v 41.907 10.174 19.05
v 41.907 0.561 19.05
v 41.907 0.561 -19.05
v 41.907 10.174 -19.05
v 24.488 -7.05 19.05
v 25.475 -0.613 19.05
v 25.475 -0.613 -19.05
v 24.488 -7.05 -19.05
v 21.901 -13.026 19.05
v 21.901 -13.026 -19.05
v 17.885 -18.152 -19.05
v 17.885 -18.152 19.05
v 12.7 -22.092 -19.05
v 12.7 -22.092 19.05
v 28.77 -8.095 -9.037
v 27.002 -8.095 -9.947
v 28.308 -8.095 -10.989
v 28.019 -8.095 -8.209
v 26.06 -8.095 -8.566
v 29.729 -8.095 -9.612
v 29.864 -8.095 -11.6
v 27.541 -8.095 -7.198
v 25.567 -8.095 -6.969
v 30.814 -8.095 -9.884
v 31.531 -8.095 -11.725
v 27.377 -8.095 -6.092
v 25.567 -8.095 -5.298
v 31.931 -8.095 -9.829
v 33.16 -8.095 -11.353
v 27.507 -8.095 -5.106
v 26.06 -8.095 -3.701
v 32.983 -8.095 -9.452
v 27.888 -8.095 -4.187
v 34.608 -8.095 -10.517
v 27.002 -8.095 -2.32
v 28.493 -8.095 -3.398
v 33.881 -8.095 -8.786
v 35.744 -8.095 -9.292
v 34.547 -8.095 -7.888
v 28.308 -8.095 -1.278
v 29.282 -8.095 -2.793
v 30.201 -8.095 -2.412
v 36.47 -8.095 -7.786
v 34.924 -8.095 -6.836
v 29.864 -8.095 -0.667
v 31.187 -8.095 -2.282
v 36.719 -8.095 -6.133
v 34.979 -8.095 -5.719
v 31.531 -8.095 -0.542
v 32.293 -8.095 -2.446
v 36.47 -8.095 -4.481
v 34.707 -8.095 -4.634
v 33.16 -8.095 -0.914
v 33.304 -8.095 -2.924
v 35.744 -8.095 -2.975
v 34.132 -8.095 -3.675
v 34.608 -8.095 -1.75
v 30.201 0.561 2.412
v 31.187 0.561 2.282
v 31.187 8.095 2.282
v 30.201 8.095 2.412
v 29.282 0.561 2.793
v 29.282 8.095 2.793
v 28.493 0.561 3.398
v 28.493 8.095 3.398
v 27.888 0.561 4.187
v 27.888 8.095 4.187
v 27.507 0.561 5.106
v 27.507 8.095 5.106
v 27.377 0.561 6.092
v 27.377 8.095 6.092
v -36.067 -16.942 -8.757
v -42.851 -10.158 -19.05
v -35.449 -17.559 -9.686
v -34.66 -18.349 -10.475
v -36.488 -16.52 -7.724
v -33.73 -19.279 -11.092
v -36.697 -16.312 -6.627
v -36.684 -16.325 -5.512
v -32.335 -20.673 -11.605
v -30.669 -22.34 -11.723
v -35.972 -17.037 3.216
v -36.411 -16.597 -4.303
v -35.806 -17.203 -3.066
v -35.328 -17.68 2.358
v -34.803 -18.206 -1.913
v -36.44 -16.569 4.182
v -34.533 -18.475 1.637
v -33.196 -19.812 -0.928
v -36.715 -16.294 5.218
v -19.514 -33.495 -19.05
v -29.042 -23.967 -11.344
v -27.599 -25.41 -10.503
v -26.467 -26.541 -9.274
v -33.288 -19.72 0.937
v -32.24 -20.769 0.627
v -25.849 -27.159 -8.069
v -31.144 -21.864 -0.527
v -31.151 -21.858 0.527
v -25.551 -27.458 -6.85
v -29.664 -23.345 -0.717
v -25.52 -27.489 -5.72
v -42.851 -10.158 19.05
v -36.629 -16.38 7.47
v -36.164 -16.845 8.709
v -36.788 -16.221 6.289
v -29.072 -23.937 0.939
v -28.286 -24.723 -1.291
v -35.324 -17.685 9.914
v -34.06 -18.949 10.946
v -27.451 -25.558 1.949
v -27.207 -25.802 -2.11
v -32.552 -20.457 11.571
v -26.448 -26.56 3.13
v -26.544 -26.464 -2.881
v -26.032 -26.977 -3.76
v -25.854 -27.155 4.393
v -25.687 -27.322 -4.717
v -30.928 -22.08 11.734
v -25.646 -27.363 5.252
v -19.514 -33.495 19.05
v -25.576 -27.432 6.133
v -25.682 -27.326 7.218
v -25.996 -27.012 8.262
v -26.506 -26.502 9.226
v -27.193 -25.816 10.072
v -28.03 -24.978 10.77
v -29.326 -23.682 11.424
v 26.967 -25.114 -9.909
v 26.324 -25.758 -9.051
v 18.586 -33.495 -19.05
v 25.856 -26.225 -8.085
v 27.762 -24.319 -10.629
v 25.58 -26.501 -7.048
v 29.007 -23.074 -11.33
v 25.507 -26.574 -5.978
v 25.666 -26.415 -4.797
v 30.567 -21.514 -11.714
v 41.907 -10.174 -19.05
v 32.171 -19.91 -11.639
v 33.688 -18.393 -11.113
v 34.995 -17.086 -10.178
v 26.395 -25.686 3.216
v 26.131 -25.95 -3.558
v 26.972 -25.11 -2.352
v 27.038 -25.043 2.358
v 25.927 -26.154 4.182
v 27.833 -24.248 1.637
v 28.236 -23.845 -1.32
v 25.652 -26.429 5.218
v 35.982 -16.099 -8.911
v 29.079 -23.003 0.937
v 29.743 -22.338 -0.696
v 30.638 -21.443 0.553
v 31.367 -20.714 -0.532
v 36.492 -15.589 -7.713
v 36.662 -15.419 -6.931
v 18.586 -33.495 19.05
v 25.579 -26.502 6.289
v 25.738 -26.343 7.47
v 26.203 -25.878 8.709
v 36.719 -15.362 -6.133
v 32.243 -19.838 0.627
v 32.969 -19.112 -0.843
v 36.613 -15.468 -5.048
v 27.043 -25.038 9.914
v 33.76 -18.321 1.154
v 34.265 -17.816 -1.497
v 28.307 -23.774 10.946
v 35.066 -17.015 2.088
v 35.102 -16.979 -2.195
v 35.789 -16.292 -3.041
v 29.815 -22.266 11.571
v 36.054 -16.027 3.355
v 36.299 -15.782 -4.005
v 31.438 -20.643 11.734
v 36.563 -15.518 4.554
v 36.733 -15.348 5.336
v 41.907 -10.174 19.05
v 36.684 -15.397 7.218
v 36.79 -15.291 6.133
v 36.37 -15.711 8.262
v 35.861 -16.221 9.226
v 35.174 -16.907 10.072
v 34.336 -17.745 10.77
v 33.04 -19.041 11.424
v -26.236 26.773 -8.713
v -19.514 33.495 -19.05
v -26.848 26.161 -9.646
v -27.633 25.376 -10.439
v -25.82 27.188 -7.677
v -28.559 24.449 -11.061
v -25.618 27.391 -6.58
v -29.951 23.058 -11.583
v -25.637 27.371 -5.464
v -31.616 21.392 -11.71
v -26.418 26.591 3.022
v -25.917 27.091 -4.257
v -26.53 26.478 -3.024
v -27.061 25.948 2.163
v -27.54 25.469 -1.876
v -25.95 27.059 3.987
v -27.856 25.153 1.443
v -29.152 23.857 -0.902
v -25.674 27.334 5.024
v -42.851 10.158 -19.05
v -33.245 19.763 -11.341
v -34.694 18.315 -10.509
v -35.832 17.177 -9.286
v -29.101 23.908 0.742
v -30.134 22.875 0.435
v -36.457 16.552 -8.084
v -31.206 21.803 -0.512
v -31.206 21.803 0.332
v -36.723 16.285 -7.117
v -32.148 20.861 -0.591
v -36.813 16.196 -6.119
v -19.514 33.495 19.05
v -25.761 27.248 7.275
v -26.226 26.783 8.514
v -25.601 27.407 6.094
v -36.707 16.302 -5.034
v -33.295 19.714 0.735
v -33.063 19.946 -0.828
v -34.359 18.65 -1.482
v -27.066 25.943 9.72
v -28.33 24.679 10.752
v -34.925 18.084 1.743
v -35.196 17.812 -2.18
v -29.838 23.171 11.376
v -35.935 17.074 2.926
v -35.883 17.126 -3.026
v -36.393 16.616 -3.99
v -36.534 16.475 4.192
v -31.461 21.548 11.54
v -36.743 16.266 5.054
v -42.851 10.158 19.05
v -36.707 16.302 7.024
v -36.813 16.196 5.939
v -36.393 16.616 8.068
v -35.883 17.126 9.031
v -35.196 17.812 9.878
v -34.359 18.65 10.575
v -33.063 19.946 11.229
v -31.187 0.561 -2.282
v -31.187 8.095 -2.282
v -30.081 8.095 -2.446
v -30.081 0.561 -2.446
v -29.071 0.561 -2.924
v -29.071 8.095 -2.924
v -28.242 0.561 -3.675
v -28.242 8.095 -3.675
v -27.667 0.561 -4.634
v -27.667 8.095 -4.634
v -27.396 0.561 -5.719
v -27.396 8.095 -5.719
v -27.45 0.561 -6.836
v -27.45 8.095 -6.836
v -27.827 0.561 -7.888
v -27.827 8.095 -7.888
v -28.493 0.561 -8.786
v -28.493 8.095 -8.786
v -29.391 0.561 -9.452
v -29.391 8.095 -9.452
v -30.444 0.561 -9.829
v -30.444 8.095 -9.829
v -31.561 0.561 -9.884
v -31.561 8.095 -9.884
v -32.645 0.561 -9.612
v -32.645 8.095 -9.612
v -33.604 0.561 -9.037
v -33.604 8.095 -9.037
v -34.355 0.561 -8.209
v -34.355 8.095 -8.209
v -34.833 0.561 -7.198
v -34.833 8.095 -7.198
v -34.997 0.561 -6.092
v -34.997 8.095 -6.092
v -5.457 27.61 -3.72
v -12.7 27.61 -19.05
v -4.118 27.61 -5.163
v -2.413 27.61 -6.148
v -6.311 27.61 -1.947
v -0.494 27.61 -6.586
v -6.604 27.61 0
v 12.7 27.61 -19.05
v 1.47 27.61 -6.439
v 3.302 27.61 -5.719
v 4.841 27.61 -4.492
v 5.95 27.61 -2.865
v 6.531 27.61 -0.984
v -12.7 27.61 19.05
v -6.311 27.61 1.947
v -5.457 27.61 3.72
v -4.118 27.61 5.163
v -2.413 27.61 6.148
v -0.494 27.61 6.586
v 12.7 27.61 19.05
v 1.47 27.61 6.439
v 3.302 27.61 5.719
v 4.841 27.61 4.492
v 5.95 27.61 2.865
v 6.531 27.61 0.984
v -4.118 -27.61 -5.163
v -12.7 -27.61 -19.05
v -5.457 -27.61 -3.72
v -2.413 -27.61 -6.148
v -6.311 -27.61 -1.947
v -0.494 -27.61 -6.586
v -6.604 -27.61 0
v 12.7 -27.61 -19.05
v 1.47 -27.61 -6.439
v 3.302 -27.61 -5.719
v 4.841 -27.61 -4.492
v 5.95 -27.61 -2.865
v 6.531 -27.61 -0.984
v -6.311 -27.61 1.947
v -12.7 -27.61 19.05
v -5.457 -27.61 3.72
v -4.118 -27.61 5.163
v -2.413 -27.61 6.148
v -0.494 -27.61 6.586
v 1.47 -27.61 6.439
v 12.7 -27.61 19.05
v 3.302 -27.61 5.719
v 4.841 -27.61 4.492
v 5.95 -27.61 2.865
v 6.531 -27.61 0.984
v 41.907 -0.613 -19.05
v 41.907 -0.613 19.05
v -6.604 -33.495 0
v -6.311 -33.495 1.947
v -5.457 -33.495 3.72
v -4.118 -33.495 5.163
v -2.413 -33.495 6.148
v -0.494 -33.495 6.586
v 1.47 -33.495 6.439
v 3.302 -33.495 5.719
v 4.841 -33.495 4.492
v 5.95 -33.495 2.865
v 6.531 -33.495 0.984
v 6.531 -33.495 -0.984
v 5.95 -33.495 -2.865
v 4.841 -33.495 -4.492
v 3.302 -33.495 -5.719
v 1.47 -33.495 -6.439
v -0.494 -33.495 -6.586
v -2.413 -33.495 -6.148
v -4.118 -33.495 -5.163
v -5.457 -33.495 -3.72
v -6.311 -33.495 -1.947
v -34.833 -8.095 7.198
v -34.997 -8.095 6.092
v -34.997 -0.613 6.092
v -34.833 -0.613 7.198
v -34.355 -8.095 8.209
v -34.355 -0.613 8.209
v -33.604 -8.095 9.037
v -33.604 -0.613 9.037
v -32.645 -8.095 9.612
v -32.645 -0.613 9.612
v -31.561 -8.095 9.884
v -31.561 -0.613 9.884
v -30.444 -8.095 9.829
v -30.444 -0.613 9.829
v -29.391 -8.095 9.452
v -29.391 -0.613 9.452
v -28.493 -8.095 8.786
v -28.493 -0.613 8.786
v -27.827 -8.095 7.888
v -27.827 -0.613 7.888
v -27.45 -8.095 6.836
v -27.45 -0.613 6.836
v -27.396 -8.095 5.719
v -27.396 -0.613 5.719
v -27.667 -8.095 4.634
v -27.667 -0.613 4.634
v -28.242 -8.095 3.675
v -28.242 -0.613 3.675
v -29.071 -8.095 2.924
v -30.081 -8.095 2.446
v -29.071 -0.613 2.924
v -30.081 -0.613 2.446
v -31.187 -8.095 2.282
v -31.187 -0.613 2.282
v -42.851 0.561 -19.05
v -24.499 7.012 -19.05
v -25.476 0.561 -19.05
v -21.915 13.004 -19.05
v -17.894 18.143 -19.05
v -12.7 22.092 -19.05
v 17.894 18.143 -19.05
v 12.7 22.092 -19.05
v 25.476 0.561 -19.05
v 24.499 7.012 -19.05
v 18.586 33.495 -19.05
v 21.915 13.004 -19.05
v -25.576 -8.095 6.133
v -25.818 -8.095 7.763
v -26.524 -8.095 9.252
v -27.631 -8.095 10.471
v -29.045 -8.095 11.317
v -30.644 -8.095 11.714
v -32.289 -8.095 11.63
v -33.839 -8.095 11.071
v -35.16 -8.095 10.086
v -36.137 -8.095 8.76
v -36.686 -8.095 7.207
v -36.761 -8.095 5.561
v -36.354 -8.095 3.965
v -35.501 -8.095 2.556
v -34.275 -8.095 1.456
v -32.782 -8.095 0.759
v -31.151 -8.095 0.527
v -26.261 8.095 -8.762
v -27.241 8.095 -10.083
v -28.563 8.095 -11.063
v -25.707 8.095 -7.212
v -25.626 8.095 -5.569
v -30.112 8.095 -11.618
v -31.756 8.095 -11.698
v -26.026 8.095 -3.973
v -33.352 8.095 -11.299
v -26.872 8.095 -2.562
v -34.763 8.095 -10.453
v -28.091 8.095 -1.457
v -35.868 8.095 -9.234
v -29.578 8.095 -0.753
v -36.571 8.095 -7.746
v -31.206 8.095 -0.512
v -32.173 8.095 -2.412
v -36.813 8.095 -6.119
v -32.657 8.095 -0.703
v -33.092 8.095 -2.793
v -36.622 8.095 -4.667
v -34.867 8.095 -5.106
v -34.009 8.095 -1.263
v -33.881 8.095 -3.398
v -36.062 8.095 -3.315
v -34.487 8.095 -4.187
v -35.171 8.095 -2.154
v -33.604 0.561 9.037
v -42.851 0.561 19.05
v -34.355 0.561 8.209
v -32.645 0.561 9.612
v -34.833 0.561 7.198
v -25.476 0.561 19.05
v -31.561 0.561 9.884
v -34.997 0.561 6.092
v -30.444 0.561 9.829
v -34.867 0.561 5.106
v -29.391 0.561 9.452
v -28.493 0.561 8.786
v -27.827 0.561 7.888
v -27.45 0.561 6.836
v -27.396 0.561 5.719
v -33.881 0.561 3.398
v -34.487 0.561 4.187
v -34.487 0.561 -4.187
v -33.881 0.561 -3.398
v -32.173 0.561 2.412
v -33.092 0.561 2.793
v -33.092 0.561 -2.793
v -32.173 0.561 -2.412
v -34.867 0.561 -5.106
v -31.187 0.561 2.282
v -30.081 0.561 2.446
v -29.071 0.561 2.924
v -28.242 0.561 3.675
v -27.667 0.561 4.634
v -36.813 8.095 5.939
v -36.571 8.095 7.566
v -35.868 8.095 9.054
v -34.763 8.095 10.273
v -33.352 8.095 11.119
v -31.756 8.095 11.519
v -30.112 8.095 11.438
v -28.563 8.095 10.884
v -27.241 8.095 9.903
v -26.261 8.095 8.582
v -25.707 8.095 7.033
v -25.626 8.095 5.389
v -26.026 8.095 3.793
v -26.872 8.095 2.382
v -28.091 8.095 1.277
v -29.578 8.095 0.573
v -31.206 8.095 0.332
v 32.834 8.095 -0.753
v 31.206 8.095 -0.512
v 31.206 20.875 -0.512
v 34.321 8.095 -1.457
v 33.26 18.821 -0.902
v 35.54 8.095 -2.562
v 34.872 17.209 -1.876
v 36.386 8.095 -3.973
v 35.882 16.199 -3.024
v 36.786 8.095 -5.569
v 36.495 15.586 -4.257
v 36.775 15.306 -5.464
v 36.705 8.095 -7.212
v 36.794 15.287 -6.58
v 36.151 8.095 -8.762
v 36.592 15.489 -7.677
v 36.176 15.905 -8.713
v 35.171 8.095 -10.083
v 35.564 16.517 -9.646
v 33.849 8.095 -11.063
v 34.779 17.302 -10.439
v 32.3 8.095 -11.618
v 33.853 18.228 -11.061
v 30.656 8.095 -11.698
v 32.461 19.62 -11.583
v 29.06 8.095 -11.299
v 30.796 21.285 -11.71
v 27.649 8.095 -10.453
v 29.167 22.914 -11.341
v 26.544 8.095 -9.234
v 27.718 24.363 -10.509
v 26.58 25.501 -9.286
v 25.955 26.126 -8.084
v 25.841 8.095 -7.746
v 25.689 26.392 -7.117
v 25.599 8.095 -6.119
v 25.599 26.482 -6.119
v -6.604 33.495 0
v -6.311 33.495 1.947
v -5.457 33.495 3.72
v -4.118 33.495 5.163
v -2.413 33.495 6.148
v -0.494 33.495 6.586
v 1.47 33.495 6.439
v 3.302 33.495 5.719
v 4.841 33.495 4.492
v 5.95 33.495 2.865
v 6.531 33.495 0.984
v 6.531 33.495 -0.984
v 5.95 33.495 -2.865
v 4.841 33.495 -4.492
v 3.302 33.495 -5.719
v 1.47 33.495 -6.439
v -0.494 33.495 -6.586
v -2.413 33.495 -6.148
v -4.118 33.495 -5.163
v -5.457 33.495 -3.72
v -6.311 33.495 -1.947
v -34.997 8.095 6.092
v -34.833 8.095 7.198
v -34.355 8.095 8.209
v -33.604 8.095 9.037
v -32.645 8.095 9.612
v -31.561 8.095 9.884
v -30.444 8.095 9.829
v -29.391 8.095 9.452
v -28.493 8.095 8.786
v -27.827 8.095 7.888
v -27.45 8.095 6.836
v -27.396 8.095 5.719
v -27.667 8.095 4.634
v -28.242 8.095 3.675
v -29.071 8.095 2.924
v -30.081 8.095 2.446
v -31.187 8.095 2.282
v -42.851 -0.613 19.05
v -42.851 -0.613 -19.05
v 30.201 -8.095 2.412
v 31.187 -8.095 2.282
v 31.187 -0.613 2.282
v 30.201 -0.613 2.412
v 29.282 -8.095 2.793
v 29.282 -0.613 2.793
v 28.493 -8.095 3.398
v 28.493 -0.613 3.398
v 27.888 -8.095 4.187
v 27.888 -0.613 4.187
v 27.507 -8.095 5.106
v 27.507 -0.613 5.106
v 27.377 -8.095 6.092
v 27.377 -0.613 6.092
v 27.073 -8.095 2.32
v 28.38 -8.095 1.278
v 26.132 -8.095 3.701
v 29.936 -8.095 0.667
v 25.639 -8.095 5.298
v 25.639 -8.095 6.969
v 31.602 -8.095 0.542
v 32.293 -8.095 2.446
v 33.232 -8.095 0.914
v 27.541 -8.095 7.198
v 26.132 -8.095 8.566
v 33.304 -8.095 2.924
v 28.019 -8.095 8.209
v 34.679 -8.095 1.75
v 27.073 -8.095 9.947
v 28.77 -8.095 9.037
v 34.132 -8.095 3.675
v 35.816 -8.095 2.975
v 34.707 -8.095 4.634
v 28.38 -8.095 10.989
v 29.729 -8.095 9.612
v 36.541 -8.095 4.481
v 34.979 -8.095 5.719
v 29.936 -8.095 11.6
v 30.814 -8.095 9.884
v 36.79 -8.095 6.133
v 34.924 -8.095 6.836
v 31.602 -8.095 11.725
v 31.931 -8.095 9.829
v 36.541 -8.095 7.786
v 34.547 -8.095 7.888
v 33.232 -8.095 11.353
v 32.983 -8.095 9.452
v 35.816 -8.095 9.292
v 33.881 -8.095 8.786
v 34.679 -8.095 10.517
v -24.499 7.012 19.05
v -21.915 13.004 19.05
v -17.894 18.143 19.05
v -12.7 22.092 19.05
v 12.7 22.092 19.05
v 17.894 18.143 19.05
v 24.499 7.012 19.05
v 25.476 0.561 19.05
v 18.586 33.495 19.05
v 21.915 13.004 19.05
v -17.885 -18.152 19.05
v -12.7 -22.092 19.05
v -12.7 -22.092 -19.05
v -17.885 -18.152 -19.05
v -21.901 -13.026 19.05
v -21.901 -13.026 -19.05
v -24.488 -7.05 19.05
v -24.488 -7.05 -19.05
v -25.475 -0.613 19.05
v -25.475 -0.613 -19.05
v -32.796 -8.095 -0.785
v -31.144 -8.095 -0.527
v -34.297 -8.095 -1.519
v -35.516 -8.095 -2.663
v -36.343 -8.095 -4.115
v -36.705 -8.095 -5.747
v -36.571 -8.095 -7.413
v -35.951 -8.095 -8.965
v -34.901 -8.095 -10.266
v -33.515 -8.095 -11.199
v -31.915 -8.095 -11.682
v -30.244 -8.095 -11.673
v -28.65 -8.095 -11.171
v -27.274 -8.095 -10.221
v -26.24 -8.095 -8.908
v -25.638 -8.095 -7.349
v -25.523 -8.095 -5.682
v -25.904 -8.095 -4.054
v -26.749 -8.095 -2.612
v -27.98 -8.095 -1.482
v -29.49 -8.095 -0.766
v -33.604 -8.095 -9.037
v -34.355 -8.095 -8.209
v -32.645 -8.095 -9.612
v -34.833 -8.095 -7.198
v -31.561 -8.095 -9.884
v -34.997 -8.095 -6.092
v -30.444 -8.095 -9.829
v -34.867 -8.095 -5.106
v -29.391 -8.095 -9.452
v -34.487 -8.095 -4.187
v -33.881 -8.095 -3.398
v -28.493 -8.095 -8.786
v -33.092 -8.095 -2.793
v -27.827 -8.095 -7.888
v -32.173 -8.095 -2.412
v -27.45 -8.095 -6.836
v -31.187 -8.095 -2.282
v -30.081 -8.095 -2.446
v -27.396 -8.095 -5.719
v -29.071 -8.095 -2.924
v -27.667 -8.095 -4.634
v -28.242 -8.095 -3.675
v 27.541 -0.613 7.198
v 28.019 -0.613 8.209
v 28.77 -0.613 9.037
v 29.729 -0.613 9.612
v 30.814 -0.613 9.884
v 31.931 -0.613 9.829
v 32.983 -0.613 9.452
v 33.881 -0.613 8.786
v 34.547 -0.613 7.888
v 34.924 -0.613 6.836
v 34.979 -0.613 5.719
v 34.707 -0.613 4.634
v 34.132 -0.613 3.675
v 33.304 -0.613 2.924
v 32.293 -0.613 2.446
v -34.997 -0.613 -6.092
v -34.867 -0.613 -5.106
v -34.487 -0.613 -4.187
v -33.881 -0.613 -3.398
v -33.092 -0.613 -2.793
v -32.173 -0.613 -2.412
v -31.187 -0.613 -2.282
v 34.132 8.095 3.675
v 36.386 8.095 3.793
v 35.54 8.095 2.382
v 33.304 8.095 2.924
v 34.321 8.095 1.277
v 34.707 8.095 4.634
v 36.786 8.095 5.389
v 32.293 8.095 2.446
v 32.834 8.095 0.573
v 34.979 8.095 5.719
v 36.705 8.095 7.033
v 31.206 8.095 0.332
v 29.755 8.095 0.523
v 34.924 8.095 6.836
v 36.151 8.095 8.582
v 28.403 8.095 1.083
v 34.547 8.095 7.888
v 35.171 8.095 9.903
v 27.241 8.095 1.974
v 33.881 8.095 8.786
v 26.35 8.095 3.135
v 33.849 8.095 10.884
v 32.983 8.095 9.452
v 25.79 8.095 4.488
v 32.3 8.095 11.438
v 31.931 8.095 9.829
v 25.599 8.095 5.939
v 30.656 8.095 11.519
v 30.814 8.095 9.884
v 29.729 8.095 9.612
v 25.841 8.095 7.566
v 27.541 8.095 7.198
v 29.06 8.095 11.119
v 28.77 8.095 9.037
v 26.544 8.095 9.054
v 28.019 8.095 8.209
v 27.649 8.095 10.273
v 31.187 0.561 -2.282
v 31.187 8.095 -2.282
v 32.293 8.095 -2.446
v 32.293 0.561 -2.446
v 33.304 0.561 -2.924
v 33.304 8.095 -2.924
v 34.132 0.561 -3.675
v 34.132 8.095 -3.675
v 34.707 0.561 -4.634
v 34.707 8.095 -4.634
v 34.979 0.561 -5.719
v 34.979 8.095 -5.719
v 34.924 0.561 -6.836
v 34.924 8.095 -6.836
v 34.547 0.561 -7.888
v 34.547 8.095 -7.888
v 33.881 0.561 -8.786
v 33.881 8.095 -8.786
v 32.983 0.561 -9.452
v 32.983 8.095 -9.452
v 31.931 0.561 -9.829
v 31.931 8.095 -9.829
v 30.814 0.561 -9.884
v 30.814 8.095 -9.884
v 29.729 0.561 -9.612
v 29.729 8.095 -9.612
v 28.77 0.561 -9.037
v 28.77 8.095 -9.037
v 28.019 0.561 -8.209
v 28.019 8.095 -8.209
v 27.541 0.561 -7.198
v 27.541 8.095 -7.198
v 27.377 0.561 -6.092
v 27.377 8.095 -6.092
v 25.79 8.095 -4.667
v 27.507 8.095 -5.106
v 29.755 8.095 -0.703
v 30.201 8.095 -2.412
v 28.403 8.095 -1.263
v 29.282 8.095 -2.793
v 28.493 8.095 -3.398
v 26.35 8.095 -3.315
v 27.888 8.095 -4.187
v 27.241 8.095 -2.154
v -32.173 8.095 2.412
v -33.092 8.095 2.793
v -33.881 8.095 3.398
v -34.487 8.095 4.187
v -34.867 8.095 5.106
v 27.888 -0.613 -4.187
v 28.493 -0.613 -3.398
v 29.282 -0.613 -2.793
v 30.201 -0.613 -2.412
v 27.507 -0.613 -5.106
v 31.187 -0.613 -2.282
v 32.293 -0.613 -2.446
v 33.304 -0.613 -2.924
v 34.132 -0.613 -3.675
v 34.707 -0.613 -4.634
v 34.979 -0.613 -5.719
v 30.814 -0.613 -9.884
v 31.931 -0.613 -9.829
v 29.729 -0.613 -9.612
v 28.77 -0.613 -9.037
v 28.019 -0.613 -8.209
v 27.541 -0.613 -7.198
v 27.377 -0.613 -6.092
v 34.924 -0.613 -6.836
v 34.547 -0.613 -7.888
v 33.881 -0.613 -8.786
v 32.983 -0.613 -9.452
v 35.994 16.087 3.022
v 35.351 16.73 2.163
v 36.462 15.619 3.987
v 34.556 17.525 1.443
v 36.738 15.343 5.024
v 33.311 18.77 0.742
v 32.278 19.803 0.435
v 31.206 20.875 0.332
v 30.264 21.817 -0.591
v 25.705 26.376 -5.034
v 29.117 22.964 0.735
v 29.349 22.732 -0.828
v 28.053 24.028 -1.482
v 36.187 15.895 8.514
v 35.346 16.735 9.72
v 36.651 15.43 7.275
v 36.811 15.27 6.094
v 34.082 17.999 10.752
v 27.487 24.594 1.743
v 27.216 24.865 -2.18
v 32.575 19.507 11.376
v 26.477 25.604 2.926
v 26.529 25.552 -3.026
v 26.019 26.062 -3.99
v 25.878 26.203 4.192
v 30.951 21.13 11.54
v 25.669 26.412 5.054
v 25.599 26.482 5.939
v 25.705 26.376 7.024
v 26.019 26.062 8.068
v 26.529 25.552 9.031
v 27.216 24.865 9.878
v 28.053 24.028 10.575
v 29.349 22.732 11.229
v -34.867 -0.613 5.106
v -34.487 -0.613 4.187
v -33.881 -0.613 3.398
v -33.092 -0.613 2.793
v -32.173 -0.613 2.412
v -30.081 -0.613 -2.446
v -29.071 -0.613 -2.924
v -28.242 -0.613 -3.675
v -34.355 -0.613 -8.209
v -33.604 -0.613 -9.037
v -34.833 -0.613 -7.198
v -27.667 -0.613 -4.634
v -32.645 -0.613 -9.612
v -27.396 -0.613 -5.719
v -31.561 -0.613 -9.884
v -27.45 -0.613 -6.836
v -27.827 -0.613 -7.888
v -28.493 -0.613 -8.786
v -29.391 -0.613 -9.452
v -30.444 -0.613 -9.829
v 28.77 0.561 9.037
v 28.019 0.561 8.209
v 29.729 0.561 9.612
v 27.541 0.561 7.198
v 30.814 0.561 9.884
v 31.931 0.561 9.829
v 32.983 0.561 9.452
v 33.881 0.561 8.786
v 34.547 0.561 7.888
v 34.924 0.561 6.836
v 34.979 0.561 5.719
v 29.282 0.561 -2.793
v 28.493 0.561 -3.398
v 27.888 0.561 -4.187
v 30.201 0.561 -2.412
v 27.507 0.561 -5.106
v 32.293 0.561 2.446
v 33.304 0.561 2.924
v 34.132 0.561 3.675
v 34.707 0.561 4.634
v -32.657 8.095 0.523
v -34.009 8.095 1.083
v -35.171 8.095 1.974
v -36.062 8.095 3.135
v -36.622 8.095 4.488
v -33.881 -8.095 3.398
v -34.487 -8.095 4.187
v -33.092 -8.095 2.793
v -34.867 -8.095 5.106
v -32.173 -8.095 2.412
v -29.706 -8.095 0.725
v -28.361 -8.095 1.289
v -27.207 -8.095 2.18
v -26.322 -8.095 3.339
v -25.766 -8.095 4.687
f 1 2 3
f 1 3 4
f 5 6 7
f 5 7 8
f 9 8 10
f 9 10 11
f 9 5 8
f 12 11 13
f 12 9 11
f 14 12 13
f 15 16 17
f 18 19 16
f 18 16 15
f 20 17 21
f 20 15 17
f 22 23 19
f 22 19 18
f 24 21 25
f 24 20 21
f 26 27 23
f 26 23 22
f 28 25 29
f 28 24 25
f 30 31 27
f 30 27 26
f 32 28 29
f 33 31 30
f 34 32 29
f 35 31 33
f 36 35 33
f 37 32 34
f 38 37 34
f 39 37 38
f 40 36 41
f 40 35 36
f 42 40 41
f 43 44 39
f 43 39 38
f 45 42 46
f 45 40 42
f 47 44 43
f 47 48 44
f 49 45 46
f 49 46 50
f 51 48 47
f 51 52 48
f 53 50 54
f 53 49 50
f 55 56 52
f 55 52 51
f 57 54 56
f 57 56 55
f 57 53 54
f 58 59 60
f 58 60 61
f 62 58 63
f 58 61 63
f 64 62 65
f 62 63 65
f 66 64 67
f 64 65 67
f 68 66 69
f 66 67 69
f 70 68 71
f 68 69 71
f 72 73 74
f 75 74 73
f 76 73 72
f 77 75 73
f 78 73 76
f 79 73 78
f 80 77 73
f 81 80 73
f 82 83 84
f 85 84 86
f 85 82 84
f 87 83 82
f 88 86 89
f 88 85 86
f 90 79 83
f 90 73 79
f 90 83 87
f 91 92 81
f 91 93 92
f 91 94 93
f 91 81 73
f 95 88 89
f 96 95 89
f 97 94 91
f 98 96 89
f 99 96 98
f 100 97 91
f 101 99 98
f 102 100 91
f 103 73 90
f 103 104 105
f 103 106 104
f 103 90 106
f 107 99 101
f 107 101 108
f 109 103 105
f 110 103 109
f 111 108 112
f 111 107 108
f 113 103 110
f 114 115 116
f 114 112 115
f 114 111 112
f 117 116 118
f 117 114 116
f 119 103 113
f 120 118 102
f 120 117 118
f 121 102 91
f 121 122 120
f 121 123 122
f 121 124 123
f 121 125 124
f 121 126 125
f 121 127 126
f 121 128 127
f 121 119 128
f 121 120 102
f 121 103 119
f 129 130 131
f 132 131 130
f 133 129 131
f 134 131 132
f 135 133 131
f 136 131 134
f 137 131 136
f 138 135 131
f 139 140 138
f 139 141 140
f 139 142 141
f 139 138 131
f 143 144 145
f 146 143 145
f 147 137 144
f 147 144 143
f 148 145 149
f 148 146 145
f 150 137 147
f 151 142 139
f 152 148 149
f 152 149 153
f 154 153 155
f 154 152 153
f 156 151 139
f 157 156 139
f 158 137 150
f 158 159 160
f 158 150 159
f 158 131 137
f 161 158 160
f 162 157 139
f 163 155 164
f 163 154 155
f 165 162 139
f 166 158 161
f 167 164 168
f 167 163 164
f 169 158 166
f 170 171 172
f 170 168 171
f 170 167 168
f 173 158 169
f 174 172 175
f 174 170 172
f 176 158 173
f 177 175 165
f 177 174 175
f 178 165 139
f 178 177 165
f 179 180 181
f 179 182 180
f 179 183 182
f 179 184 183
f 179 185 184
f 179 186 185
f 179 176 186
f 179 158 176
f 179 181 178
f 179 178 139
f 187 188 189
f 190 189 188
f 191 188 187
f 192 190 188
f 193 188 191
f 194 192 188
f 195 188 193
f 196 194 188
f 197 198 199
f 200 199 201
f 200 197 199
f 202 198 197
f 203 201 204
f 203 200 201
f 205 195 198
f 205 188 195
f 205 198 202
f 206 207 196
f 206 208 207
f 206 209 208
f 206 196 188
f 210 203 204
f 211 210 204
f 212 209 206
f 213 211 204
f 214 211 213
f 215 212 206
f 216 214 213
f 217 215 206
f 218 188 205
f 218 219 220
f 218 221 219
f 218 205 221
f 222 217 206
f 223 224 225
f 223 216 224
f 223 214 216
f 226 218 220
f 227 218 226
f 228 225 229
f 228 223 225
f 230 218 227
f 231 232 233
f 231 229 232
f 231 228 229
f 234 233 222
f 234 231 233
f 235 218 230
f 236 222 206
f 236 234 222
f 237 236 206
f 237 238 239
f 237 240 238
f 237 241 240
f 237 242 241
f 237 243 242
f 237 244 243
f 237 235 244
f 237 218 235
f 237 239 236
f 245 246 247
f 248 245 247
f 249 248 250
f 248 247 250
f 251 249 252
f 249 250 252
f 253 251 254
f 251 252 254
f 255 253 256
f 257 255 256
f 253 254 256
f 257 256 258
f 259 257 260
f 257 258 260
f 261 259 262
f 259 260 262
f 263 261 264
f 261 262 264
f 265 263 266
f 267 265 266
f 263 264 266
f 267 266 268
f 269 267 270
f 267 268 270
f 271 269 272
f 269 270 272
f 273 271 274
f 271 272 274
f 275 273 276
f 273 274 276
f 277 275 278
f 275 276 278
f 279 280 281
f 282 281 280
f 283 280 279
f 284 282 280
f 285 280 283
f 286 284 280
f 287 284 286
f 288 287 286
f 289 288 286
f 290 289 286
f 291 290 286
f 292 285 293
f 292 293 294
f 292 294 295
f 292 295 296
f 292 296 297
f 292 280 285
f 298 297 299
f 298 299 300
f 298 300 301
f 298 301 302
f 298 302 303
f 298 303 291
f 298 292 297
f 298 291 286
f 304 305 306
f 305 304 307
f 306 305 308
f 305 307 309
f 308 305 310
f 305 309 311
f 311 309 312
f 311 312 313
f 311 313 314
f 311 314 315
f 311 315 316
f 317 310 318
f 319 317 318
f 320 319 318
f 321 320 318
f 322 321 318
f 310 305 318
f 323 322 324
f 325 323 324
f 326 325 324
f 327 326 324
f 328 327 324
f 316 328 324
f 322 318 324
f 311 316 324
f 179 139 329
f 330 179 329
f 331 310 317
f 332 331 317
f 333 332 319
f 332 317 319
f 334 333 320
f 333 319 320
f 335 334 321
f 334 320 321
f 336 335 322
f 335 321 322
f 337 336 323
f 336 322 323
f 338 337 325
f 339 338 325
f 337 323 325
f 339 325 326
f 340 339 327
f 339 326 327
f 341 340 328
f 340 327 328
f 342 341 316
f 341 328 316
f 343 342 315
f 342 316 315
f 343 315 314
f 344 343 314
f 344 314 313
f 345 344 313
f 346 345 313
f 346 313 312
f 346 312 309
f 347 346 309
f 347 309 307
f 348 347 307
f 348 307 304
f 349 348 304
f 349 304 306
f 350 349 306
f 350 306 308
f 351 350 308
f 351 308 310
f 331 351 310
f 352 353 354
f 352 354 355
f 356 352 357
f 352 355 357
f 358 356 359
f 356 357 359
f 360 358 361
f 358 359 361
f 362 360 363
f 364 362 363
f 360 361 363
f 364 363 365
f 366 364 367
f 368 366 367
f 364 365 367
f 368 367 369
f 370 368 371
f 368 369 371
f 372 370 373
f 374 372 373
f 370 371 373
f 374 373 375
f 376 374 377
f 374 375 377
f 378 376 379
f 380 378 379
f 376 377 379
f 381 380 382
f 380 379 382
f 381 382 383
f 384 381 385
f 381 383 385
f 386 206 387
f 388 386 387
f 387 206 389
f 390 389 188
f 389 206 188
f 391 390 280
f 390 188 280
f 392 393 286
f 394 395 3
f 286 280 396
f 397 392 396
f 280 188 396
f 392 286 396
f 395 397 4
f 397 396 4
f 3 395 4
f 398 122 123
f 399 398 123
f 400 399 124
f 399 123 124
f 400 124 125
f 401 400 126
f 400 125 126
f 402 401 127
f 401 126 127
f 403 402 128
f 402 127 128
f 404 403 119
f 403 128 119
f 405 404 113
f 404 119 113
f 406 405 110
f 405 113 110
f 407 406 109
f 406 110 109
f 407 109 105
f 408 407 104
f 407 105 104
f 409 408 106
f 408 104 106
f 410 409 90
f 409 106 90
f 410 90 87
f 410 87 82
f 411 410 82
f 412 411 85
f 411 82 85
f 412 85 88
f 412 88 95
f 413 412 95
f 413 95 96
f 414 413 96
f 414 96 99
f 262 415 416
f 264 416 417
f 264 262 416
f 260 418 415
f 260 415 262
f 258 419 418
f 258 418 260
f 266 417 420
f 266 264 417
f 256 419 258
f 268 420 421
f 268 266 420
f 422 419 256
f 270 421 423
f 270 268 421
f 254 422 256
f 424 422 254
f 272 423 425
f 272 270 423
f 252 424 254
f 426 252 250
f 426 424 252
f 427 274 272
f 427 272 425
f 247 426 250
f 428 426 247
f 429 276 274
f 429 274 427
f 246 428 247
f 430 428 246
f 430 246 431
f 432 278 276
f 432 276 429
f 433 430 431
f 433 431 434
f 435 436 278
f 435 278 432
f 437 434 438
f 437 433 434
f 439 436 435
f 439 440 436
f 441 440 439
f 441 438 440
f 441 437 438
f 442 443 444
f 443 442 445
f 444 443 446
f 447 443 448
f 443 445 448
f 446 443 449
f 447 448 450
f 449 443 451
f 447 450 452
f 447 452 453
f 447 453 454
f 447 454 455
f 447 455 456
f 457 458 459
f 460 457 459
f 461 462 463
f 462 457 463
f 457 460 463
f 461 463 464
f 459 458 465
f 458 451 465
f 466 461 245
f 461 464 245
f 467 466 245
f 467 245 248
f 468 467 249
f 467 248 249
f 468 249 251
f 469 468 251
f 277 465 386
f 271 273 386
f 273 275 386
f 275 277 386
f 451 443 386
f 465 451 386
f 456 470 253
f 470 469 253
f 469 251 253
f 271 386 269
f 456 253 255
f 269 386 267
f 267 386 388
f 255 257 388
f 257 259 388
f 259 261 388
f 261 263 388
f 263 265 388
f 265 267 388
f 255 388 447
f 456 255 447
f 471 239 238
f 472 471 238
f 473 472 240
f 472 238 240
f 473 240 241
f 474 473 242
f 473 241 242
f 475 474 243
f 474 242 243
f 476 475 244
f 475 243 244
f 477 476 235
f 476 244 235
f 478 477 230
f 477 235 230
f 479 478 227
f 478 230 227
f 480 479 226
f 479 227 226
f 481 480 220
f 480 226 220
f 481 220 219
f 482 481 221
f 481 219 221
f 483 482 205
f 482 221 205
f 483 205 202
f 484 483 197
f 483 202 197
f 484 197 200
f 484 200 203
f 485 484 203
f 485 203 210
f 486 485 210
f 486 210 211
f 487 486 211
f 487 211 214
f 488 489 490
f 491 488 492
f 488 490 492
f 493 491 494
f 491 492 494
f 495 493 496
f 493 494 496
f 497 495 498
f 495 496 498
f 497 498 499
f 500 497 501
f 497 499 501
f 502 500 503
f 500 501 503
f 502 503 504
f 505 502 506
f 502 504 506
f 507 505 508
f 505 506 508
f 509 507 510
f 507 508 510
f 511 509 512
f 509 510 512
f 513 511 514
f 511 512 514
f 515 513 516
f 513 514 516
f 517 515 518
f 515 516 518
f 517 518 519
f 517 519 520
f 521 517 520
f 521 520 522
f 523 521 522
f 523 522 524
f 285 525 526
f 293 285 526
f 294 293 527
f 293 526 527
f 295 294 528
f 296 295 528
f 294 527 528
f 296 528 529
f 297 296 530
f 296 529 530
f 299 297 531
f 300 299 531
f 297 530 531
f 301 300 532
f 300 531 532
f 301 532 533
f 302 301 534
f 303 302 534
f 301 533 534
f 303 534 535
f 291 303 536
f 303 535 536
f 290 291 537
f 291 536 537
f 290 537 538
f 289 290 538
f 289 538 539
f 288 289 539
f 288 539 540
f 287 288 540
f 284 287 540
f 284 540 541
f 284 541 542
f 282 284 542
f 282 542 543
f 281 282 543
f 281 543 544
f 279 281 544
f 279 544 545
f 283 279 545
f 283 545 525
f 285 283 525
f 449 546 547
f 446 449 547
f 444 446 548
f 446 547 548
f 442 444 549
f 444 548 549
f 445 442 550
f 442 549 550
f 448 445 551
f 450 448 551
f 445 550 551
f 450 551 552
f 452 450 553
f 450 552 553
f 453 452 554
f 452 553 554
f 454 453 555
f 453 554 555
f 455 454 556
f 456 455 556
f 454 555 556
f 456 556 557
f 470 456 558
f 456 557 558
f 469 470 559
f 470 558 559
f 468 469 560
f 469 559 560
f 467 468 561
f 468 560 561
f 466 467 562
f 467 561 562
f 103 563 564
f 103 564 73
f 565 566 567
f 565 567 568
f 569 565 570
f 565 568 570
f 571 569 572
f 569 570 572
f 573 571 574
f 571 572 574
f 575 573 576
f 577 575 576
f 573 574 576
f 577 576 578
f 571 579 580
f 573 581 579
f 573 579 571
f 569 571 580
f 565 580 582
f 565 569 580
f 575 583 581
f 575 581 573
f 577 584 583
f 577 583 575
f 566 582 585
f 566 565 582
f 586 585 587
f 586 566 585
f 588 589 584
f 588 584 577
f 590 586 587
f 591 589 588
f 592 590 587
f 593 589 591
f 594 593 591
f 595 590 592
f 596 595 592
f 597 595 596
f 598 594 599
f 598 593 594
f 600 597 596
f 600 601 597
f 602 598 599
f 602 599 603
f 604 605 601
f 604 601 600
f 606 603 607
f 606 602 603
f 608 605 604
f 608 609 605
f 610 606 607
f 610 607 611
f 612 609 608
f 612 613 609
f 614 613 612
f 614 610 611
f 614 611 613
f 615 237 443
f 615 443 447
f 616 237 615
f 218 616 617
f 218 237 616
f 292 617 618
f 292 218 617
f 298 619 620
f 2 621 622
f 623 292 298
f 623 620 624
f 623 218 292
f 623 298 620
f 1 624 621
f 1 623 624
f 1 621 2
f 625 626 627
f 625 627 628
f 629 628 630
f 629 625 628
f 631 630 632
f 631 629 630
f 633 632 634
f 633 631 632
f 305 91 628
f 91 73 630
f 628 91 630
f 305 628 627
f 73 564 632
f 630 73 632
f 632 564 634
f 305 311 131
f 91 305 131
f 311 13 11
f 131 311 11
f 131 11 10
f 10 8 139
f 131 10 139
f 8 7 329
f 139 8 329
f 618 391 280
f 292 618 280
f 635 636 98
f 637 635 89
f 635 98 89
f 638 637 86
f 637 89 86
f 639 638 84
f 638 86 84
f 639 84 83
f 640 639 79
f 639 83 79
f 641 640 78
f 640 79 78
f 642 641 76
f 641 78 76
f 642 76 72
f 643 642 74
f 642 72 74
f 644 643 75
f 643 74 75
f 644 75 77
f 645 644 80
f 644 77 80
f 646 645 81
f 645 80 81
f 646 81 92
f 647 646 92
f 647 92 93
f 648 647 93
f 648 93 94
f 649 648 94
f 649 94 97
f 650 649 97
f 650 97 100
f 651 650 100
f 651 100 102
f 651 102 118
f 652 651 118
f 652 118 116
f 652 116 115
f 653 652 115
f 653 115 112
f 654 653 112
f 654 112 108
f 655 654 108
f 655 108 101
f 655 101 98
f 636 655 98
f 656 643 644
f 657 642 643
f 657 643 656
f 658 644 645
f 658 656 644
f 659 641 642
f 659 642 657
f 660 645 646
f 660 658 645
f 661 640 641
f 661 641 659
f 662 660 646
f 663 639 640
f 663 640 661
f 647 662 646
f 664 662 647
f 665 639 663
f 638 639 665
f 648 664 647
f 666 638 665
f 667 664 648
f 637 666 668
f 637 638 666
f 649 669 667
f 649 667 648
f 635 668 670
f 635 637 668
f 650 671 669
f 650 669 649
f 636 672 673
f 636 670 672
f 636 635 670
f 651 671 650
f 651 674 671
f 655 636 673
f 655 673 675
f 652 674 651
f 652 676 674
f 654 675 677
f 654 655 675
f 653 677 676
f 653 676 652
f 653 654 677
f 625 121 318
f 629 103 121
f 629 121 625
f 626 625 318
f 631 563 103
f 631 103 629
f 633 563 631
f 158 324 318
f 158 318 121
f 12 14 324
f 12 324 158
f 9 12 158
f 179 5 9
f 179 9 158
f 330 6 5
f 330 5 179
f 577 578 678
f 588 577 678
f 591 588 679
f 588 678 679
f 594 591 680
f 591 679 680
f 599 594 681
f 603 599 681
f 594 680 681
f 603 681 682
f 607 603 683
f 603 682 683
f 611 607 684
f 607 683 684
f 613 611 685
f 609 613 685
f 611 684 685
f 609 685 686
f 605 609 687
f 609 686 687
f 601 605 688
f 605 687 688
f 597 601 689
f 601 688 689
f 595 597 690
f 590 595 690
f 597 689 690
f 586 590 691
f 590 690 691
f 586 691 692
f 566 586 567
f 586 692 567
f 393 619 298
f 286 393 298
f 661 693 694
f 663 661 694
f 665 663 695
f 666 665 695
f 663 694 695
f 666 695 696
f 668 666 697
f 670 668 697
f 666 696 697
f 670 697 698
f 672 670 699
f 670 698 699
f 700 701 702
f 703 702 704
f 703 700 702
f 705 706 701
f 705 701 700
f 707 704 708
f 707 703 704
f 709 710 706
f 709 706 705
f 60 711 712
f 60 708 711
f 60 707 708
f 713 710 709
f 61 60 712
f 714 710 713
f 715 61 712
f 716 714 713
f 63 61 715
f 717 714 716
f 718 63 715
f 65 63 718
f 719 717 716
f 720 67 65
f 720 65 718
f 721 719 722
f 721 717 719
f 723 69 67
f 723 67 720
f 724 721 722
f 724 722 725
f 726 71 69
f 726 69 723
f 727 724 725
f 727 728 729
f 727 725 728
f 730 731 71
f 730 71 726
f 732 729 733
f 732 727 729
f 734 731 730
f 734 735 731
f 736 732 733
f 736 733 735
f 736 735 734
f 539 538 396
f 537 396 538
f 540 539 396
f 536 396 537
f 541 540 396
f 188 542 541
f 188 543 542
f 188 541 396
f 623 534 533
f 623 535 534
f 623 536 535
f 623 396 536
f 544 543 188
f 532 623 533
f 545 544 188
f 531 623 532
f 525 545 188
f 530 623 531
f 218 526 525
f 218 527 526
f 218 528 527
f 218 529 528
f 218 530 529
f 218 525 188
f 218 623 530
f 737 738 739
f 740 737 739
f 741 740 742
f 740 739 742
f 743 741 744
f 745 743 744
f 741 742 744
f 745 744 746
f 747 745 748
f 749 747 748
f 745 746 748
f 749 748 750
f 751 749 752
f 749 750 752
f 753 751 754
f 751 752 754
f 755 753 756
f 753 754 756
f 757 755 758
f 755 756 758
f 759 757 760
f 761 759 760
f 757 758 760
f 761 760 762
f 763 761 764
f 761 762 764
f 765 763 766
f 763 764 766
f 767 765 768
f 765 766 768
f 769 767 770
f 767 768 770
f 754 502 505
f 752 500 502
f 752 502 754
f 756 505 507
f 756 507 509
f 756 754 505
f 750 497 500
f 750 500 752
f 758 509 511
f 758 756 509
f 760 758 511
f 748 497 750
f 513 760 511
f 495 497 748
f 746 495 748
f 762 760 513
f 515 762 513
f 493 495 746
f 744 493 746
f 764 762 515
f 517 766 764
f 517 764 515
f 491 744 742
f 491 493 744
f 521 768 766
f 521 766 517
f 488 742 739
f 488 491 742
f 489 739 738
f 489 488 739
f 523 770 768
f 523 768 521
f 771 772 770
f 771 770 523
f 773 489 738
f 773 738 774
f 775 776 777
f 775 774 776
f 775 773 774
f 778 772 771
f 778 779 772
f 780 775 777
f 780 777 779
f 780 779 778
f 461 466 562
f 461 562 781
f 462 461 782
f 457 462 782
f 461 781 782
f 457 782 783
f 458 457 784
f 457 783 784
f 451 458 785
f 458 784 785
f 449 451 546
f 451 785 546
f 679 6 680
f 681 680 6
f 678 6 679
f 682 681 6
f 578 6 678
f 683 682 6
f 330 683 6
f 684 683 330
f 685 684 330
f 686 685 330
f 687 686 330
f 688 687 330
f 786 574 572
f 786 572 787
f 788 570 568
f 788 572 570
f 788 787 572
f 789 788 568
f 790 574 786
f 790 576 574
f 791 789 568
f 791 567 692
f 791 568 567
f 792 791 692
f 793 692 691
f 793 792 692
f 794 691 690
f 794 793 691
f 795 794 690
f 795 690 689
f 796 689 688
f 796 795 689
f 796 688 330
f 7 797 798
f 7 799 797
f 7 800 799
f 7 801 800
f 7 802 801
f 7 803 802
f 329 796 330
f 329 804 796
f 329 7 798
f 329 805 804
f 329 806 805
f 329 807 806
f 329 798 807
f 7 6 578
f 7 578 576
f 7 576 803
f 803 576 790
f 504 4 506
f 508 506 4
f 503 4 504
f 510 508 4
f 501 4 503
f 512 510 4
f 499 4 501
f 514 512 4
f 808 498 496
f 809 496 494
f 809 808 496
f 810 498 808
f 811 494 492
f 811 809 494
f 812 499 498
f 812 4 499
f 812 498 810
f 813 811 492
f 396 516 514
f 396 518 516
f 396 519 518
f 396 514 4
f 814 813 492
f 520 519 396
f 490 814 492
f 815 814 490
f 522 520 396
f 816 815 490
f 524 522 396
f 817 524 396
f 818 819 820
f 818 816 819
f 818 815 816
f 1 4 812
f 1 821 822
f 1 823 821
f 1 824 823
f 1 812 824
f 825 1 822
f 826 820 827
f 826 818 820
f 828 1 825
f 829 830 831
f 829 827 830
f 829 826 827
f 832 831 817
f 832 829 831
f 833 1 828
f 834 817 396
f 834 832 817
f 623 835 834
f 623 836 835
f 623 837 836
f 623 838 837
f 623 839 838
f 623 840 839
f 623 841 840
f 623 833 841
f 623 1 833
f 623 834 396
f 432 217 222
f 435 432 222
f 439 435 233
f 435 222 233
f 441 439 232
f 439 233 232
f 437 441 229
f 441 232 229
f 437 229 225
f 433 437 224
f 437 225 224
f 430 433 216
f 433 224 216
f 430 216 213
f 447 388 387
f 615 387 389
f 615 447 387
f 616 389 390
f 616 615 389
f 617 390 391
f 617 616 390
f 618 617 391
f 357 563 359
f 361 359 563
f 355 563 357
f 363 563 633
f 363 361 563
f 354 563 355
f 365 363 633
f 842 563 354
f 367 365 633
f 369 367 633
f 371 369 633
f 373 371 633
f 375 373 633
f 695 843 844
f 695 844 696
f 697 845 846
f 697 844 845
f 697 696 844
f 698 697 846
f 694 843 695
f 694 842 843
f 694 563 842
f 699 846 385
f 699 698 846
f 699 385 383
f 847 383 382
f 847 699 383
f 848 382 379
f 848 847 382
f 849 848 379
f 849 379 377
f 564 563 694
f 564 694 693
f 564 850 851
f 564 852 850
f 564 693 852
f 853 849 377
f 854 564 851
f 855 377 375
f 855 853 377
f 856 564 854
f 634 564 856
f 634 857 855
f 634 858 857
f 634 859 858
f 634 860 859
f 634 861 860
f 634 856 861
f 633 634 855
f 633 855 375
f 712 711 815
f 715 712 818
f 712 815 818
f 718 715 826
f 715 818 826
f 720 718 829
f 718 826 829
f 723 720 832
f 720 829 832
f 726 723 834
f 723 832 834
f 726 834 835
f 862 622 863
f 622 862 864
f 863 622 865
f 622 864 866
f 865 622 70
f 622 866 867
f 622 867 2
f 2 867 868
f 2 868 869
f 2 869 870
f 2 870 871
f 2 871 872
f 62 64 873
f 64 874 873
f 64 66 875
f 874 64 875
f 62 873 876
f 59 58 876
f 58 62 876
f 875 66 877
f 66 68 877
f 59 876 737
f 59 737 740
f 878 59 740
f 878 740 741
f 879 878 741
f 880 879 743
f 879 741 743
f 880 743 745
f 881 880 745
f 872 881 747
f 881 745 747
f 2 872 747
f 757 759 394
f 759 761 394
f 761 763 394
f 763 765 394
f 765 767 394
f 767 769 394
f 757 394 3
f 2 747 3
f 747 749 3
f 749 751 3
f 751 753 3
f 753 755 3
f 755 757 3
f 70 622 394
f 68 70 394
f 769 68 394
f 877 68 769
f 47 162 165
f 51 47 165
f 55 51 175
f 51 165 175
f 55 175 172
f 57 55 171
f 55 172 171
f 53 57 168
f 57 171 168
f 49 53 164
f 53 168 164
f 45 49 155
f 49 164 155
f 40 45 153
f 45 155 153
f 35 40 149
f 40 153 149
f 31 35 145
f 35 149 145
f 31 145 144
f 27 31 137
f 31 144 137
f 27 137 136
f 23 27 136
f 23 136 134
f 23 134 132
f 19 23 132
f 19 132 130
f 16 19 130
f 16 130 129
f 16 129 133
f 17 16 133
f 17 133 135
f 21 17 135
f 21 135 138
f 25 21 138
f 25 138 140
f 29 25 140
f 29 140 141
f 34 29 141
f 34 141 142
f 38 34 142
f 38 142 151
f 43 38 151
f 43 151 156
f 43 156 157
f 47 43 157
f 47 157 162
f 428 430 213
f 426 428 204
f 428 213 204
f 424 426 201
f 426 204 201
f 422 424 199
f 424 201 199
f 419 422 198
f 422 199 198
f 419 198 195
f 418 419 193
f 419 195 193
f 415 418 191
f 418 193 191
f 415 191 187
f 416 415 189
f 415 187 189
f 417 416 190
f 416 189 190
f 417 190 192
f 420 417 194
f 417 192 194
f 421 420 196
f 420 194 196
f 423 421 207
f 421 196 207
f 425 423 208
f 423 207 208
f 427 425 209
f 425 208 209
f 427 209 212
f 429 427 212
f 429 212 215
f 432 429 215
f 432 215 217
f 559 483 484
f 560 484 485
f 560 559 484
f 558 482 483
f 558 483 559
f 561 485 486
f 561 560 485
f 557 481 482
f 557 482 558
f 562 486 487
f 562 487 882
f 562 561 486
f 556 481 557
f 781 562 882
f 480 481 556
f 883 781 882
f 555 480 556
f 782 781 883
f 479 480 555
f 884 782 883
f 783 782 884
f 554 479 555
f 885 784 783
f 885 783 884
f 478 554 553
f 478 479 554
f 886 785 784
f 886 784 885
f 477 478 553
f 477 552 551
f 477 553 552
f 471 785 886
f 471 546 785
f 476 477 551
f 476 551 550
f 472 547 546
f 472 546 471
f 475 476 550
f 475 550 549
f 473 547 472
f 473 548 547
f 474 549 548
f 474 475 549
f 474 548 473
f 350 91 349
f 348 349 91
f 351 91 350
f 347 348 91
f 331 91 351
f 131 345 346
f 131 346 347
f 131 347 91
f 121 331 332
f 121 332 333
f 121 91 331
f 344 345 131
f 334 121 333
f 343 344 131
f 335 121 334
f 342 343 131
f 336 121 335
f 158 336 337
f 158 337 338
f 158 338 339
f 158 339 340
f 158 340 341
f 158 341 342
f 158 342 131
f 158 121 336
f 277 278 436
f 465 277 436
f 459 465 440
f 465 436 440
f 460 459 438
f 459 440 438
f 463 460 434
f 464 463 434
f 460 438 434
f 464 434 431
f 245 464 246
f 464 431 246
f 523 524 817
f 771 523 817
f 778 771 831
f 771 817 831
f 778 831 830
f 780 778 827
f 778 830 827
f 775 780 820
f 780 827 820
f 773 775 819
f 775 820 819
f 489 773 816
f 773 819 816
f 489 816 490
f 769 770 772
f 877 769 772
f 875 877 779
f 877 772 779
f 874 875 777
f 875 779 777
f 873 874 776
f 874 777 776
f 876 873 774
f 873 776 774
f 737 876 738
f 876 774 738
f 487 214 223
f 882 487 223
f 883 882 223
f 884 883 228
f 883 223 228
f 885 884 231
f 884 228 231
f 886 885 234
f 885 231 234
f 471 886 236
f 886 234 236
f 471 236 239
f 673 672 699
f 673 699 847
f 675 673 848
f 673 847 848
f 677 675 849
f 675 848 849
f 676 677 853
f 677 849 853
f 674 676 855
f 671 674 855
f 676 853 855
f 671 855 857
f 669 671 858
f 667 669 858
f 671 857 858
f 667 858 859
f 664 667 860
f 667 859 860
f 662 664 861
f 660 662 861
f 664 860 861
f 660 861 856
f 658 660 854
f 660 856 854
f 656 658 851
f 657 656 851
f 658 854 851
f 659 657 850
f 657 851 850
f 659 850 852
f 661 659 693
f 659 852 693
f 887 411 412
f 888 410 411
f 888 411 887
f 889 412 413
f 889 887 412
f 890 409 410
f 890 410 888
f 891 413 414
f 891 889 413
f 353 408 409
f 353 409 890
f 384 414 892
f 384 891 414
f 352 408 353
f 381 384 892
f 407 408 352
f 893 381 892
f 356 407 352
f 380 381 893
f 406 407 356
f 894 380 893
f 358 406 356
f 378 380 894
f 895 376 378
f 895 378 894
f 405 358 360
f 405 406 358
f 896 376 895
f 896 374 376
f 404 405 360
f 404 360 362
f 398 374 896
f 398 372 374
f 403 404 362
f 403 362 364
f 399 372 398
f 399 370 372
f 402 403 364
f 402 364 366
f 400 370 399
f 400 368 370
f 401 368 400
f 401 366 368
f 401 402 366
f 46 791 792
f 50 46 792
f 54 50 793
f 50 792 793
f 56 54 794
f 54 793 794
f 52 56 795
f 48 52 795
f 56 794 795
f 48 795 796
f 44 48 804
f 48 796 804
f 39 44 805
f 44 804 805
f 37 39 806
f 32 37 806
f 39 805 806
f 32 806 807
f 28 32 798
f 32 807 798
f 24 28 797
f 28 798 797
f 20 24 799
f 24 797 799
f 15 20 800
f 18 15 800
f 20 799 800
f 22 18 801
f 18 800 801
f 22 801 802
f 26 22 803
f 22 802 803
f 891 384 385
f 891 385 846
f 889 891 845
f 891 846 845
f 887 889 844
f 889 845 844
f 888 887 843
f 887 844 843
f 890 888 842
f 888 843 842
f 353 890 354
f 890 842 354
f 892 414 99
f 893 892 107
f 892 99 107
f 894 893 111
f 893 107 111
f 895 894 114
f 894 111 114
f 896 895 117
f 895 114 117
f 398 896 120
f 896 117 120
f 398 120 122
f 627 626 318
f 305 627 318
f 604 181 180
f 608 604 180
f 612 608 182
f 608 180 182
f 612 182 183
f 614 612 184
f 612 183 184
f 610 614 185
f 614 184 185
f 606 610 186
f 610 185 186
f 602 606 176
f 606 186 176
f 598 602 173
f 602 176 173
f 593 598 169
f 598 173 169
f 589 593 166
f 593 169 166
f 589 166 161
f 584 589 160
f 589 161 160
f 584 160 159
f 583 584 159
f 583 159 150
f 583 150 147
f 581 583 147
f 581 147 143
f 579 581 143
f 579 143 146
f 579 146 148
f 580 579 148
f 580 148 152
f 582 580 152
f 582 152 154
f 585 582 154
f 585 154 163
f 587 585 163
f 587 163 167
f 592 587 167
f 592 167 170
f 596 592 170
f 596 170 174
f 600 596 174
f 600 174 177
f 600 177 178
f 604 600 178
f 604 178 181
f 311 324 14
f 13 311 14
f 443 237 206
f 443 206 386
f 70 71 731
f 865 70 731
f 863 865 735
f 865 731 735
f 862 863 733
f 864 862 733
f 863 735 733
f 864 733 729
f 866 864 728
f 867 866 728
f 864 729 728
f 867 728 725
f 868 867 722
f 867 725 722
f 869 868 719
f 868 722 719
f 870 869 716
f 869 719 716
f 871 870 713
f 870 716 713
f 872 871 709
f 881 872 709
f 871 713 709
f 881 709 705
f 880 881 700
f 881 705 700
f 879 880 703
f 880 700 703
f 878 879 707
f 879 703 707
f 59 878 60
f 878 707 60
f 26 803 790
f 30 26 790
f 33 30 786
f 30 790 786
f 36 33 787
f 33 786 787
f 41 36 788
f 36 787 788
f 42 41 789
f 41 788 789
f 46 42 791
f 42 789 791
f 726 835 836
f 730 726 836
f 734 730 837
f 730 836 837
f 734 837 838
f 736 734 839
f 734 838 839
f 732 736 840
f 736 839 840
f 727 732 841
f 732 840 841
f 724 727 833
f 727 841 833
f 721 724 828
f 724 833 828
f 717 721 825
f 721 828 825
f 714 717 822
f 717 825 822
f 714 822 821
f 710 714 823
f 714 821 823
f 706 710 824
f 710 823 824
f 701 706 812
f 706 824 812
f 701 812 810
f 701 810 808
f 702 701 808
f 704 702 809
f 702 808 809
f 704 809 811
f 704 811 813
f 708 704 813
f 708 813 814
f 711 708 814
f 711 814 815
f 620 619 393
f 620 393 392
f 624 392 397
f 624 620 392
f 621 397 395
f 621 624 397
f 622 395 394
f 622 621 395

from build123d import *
from build123d import SkipClean  # not in build123d's __all__

# Parameters (mm, degrees)
F1_DEPTH  = 19.05
F3_DEPTH  = 66.9907422194
F4_R      = 5.60689081
F5_DEPTH  = 25.4
F7_DEPTH  = 25.4
F8_W      = 110.2635304305
F8_H      = 1.1740395275
F9_DEPTH  = 38.1010001
F10_W     = 25.4
F10_H     = 6.3003107457
F11_DEPTH = 38.1010001


with BuildPart() as f1:
    # F0 (on Top) → F1 (new body, symmetric)
    with BuildSketch(Plane.XY):
        Polygon((41.9069059193, 10.174138844), (18.5861736536, 33.4948711097), (0, 33.4948711097), (-19.5138263464, 33.4948711097), (-42.8505130112, 10.1581844449), (-42.8505130112, 0), (-42.8505130112, -10.1581844449), (-19.5138263464, -33.4948711097), (18.5861736536, -33.4948711097), (41.9069059193, -10.174138844), align=None)
        with BuildLine():
            ThreePointArc((25.48255, 0), (-18.0188839069, -18.0188839069), (0, 25.48255))
            ThreePointArc((0, 25.48255), (18.0188839069, 18.0188839069), (25.48255, 0))
        make_face(mode=Mode.SUBTRACT)
    extrude(amount=F1_DEPTH, both=True)

    # F2 (on face) → F3 (cut, through all)
    with BuildSketch(Plane(origin=(0, 33.4948711097, 0), x_dir=(-1, 0, 0), z_dir=(0, 1, 0))):
        with BuildLine():
            ThreePointArc((31.1872387667, 2.2823126413), (33.8813156031, 3.398235805), (34.9972387667, 6.0923126413))
            ThreePointArc((34.9972387667, 6.0923126413), (28.4931619304, 8.7863894776), (31.1872387667, 2.2823126413))
        make_face()
        with BuildLine():
            ThreePointArc((34.9972387667, -6.0923126413), (33.8813156031, -3.398235805), (31.1872387667, -2.2823126413))
            ThreePointArc((31.1872387667, -2.2823126413), (28.4931619304, -8.7863894776), (34.9972387667, -6.0923126413))
        make_face()
        with BuildLine():
            ThreePointArc((-27.3772387667, -6.0923126413), (-28.4931619304, -3.398235805), (-31.1872387667, -2.2823126413))
            ThreePointArc((-31.1872387667, -2.2823126413), (-33.8813156031, -8.7863894776), (-27.3772387667, -6.0923126413))
        make_face()
        with BuildLine():
            ThreePointArc((-27.3772387667, 6.0923126413), (-33.8813156031, 8.7863894776), (-31.1872387667, 2.2823126413))
            ThreePointArc((-31.1872387667, 2.2823126413), (-28.4931619304, 3.398235805), (-27.3772387667, 6.0923126413))
        make_face()
        with BuildLine():
            ThreePointArc((-6.6042914247, 0), (0, -6.6042914247), (6.6042914247, 0))
            Line((6.6042914247, 0), (-6.6042914247, 0))
        make_face()
        with BuildLine():
            Line((-6.6042914247, 0), (6.6042914247, 0))
            ThreePointArc((6.6042914247, 0), (0, 6.6042914247), (-6.6042914247, 0))
        make_face()
    extrude(amount=-F3_DEPTH, mode=Mode.SUBTRACT)

    # F4 (on face) → F5 (cut)
    with BuildSketch(Plane.XZ.offset(33.4948711097)):
        with BuildLine():
            ThreePointArc((-31.1506315094, 0.5265610691), (-27.2071362658, 2.1802747004), (-25.5764710601, 6.1333563462))
            ThreePointArc((-25.5764710601, 6.1333563462), (-35.1595874746, 10.086437992), (-31.1506315094, 0.5265610691))
        make_face()
        with BuildLine():
            ThreePointArc((-25.5048626079, -6.1333563462), (-27.1586717722, -2.1571307417), (-31.1444837787, -0.5265610691))
            ThreePointArc((-31.1444837787, -0.5265610691), (-35.0648350638, -10.1095819506), (-25.5048626079, -6.1333563462))
        make_face()
        with Locations((31.111753418, -6.1333563462)):
            Circle(F4_R)
        with Locations((31.1833618702, 6.1333563462)):
            Circle(F4_R)
    extrude(amount=-F5_DEPTH, mode=Mode.SUBTRACT)

    # F6 (on face) → F7 (cut)
    with BuildSketch(Plane(origin=(0, 33.4948711097, 0), x_dir=(-1, 0, 0), z_dir=(0, 1, 0))):
        with BuildLine():
            ThreePointArc((-31.2060154974, 0.3319311278), (-27.2413449843, 1.9741514247), (-25.5991246874, 5.9388219379))
            ThreePointArc((-25.5991246874, 5.9388219379), (-35.1706860106, 9.903492451), (-31.2060154974, 0.3319311278))
        make_face()
        with BuildLine():
            ThreePointArc((36.8129063075, 5.9388219379), (27.2413449843, 9.903492451), (31.2060154974, 0.3319311278))
            ThreePointArc((31.2060154974, 0.3319311278), (35.1706860106, 1.9741514247), (36.8129063075, 5.9388219379))
        make_face()
        with BuildLine():
            ThreePointArc((36.8129063075, -6.118518766), (35.1706860106, -2.1538482529), (31.2060154974, -0.511627956))
            ThreePointArc((31.2060154974, -0.511627956), (27.2413449843, -10.0831892792), (36.8129063075, -6.118518766))
        make_face()
        with BuildLine():
            ThreePointArc((-25.5991246874, -6.118518766), (-27.2413449843, -2.1538482529), (-31.2060154974, -0.511627956))
            ThreePointArc((-31.2060154974, -0.511627956), (-35.1706860106, -10.0831892792), (-25.5991246874, -6.118518766))
        make_face()
    extrude(amount=-F7_DEPTH, mode=Mode.SUBTRACT)

    # F8 (on face) → F9 (cut, through all)
    with BuildSketch(Plane(origin=(0, 0, -19.05), x_dir=(1, 0, 0), z_dir=(0, 0, -1))):
        with Locations((5.5118532782, 0.0261101668)):
            Rectangle(F8_W, F8_H)
    extrude(amount=-F9_DEPTH, mode=Mode.SUBTRACT)

    # F10 (on face) → F11 (cut, through all)
    with BuildSketch(Plane.XY.offset(19.05)):
        Polygon((0, -21.3100345684), (-12.7, -21.3100345684), (-12.7, -27.6103453141), (12.7, -27.6103453141), (12.7, -21.3100345684), align=None)
        with Locations((0, 24.4601899413)):
            Rectangle(F10_W, F10_H)
    with SkipClean():  # cleaning this boolean's faces spoils the solid; the shape is the same uncleaned
        extrude(amount=-F11_DEPTH, mode=Mode.SUBTRACT)


solid = f1.part
